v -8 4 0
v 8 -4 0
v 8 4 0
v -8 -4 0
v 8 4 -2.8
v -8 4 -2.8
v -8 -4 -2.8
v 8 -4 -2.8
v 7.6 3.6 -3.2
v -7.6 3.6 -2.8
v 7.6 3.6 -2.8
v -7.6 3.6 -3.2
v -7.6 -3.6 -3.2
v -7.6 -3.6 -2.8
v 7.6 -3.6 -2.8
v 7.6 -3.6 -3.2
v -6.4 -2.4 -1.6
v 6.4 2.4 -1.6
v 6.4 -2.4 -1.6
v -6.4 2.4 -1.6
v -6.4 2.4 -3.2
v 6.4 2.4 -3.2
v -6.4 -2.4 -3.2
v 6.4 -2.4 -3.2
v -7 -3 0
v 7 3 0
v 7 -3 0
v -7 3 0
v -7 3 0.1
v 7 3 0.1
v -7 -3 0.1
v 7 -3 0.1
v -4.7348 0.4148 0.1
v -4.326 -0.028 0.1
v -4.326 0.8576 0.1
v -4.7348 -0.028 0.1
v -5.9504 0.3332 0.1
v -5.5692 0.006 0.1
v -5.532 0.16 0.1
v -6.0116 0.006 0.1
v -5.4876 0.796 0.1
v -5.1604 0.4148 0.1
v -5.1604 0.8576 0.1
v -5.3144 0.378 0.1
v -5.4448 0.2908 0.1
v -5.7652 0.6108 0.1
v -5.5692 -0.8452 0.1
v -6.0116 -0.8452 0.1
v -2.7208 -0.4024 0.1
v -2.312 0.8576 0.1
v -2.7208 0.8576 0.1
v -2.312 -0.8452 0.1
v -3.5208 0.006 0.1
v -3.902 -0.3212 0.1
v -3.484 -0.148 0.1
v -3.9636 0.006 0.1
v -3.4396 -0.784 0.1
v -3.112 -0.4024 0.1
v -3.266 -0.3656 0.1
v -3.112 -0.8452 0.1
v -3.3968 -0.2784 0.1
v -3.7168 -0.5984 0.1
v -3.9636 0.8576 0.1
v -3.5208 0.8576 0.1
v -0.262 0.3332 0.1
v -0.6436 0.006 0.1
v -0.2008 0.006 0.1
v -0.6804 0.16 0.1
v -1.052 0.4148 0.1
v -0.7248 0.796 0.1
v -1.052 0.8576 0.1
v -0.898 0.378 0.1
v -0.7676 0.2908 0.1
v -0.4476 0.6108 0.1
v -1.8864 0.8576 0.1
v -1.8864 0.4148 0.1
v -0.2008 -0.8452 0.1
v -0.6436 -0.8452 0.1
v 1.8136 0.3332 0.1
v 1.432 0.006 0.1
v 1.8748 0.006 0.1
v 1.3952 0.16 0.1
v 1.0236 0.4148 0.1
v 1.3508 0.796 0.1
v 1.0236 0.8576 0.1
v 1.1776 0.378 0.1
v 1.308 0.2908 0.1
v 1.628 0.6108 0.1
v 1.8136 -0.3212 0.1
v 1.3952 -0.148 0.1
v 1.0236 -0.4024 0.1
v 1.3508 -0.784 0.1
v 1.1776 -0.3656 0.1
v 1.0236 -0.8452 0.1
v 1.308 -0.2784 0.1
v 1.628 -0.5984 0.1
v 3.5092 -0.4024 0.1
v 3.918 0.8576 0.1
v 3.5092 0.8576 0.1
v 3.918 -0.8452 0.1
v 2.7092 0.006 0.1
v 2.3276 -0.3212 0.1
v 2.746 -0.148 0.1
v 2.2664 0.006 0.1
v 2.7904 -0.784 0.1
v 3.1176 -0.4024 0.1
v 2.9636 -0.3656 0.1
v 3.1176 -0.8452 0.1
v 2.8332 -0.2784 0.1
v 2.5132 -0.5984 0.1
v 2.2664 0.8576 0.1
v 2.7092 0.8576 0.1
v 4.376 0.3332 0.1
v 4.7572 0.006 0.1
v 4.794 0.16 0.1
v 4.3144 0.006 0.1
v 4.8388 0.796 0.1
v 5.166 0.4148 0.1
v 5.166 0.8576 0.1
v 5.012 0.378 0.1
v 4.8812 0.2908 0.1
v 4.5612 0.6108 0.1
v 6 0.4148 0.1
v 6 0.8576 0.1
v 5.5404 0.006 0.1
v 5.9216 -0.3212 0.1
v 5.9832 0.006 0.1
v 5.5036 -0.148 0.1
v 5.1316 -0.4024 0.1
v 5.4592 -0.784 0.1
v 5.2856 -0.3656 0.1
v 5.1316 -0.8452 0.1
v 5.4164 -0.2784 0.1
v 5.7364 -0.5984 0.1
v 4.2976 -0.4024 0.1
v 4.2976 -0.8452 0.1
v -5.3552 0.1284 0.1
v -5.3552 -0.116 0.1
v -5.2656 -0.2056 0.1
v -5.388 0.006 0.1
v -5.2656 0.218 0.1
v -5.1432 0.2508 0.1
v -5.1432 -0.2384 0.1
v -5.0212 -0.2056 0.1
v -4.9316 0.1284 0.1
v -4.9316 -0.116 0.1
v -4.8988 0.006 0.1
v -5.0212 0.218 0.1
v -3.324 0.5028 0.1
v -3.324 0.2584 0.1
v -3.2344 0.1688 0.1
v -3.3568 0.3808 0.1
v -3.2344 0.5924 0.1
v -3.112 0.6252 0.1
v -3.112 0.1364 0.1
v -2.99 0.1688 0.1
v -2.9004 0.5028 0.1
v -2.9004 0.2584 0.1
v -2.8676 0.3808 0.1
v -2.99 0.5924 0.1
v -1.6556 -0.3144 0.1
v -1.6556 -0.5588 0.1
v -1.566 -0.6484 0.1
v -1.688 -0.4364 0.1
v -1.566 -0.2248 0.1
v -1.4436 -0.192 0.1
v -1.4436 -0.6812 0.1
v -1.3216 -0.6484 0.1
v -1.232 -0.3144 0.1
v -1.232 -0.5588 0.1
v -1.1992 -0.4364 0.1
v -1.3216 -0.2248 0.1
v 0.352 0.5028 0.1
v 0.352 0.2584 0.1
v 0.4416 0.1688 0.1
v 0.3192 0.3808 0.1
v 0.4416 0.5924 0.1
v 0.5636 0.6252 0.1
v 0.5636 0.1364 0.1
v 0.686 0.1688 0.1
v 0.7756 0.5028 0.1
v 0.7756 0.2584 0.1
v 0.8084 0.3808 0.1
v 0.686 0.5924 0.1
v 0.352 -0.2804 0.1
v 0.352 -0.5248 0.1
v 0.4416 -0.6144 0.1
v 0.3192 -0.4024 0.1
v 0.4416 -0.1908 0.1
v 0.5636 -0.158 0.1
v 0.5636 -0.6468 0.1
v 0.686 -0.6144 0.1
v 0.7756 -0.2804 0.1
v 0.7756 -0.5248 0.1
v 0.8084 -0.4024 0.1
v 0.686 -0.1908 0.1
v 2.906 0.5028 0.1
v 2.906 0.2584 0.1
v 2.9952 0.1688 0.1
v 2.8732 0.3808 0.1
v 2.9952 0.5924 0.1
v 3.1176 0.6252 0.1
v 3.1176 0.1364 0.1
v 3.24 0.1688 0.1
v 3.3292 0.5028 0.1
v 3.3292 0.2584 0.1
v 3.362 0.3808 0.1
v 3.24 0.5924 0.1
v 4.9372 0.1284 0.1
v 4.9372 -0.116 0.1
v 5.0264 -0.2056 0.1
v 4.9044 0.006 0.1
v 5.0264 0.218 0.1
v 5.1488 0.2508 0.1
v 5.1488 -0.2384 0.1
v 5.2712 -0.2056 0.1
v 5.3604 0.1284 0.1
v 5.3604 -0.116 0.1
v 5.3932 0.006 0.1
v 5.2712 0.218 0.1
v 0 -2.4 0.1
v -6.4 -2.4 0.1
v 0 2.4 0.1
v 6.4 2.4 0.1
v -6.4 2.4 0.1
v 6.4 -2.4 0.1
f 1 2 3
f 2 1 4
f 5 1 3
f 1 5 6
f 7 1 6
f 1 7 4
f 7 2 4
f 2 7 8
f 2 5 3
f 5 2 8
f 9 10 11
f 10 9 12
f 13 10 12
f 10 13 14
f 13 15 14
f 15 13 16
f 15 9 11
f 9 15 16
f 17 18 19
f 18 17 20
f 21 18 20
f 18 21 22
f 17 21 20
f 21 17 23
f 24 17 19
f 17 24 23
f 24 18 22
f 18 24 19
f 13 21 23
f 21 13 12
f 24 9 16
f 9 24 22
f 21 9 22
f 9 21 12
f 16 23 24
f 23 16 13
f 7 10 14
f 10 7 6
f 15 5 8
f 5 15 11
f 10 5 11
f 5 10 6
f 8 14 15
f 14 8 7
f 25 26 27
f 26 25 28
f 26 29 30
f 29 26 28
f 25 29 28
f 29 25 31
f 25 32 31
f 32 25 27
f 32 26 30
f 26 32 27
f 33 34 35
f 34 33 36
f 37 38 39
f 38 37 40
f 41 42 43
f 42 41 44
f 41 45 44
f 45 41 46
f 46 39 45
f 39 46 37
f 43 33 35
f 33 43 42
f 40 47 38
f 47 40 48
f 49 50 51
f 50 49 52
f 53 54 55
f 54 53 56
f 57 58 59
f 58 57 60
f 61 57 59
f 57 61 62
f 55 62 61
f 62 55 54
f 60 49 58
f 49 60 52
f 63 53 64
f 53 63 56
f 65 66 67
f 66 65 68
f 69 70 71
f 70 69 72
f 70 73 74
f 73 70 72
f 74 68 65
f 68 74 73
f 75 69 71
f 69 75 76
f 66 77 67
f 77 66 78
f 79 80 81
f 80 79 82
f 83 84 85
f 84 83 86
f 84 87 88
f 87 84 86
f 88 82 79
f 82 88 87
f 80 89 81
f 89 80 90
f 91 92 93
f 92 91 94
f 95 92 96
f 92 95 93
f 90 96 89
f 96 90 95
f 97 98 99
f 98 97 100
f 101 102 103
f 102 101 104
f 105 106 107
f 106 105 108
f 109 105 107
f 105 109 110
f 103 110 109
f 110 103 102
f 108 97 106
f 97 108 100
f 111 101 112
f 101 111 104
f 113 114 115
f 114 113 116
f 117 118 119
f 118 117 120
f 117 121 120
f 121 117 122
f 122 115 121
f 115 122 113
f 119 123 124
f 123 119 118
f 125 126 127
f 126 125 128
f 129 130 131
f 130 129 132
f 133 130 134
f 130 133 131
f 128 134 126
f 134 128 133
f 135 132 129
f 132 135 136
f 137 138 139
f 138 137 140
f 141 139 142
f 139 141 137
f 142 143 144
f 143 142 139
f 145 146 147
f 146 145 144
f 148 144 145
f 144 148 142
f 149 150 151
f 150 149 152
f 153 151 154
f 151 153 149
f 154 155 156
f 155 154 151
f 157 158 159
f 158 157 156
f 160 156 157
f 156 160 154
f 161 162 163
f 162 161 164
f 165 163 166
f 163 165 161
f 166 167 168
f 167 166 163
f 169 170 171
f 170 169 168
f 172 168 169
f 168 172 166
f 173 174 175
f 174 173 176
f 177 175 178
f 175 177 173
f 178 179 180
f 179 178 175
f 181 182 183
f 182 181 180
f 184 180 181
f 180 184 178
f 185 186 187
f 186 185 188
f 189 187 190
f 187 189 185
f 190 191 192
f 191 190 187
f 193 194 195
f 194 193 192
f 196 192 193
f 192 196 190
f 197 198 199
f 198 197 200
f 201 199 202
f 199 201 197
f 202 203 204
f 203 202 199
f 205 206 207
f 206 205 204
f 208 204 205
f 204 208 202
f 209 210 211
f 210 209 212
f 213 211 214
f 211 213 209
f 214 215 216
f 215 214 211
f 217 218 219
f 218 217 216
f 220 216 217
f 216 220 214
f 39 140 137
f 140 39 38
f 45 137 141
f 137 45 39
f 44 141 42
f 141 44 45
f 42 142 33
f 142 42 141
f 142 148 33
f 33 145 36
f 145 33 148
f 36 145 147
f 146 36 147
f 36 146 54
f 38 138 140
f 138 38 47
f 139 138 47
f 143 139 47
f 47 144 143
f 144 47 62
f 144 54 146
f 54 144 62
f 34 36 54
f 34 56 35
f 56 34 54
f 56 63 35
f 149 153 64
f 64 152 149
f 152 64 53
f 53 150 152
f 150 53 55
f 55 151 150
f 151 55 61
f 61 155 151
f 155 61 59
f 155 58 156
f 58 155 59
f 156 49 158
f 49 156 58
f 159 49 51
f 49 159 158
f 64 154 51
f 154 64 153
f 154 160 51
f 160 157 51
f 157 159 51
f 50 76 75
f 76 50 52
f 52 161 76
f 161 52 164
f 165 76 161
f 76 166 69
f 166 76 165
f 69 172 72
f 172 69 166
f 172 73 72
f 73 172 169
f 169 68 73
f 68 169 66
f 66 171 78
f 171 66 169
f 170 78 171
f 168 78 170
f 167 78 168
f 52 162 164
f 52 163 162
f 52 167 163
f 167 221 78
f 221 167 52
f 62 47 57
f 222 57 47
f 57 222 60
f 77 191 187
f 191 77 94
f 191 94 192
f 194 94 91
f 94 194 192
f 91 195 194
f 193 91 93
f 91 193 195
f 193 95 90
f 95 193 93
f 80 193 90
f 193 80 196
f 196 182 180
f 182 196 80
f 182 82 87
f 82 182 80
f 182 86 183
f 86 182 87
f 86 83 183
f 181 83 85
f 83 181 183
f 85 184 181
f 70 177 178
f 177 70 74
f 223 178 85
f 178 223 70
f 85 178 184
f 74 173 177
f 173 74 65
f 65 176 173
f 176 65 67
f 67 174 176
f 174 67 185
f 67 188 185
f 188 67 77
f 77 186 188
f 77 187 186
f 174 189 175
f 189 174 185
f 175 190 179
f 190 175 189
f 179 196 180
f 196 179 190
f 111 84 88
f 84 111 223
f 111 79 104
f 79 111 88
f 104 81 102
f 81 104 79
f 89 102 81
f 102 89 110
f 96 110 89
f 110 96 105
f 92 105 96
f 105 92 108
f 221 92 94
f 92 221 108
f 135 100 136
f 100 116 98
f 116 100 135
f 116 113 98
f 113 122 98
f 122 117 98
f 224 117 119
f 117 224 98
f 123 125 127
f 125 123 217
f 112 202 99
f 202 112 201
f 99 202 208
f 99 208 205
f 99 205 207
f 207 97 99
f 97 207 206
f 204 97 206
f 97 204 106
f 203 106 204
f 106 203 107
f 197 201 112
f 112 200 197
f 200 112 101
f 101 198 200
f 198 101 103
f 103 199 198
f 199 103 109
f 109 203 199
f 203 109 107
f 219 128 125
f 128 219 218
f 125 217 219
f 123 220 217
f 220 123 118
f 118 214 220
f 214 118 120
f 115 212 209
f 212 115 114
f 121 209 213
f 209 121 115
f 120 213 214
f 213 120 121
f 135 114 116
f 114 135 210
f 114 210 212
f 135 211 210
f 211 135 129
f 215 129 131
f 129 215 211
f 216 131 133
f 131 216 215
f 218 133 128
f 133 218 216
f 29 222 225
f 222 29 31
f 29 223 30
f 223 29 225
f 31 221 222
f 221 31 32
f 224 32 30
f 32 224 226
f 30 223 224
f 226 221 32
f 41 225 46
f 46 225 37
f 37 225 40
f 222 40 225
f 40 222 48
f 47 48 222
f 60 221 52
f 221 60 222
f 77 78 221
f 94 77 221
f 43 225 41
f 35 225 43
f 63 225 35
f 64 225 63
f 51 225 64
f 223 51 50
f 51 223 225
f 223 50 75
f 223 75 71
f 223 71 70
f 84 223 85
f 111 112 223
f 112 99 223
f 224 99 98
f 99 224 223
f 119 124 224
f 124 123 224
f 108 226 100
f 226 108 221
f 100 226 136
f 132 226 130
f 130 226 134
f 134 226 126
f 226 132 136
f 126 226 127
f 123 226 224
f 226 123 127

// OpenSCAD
// file: ../p/box5.scad
use <../lib.scad>
function ldraw_lib__box5() = [
// 0 Box with 5 Faces and All Edges
// 0 Name: box5.dat
// 0 Author: James Jessiman
// 0 !LDRAW_ORG Primitive UPDATE 2012-01
// 0 !LICENSE Licensed under CC BY 4.0 : see CAreadme.txt
// 
// 0 BFC CERTIFY CCW
  [0,"BFC","CERTIFY"],
  [0,"BFC","CCW"],
// 
// 0 !HISTORY 2002-04-03 [sbliss] Modified for BFC compliance
// 0 !HISTORY 2002-04-25 [PTadmin] Official Update 2002-02
// 0 !HISTORY 2007-06-24 [PTadmin] Header formatted for Contributor Agreement
// 0 !HISTORY 2008-07-01 [PTadmin] Official Update 2008-01
// 0 !HISTORY 2012-02-16 [Philo] Changed to CCW
// 0 !HISTORY 2012-03-30 [PTadmin] Official Update 2012-01
// 
// 
// 2 24 1 1 1 -1 1 1
  [2,24,1,1,1,-1,1,1],
// 2 24 -1 1 1 -1 1 -1
  [2,24,-1,1,1,-1,1,-1],
// 2 24 -1 1 -1 1 1 -1
  [2,24,-1,1,-1,1,1,-1],
// 2 24 1 1 -1 1 1 1
  [2,24,1,1,-1,1,1,1],
// 2 24 1 0 1 -1 0 1
  [2,24,1,0,1,-1,0,1],
// 2 24 -1 0 1 -1 0 -1
  [2,24,-1,0,1,-1,0,-1],
// 2 24 -1 0 -1 1 0 -1
  [2,24,-1,0,-1,1,0,-1],
// 2 24 1 0 -1 1 0 1
  [2,24,1,0,-1,1,0,1],
// 2 24 1 0 1 1 1 1
  [2,24,1,0,1,1,1,1],
// 2 24 -1 0 1 -1 1 1
  [2,24,-1,0,1,-1,1,1],
// 2 24 1 0 -1 1 1 -1
  [2,24,1,0,-1,1,1,-1],
// 2 24 -1 0 -1 -1 1 -1
  [2,24,-1,0,-1,-1,1,-1],
// 4 16 -1 1 1 1 1 1 1 1 -1 -1 1 -1
  [4,16,-1,1,1,1,1,1,1,1,-1,-1,1,-1],
// 4 16 -1 1 1 -1 0 1 1 0 1 1 1 1
  [4,16,-1,1,1,-1,0,1,1,0,1,1,1,1],
// 4 16 -1 1 -1 -1 0 -1 -1 0 1 -1 1 1
  [4,16,-1,1,-1,-1,0,-1,-1,0,1,-1,1,1],
// 4 16 1 1 -1 1 0 -1 -1 0 -1 -1 1 -1
  [4,16,1,1,-1,1,0,-1,-1,0,-1,-1,1,-1],
// 4 16 1 1 1 1 0 1 1 0 -1 1 1 -1
  [4,16,1,1,1,1,0,1,1,0,-1,1,1,-1],
];
module ldraw_lib__box5(step=0, col=false, unit=2/5, alt=false, line=0.2, solid=!$preview)
    makepoly(ldraw_lib__box5(), step=step, col=col, unit=unit, alt=alt, line=line, solid=solid);
ldraw_lib__box5(line=0.2);
// file: ../p/box4.scad
use <../lib.scad>
function ldraw_lib__box4() = [
// 0 Box with 4 Faces (2 Parallel Pairs) and All Edges
// 0 Name: box4.dat
// 0 Author: James Jessiman
// 0 !LDRAW_ORG Primitive UPDATE 2012-01
// 0 !LICENSE Licensed under CC BY 4.0 : see CAreadme.txt
// 
// 0 BFC CERTIFY CCW
  [0,"BFC","CERTIFY"],
  [0,"BFC","CCW"],
// 
// 0 !HISTORY 2002-04-03 [sbliss] Modified for BFC compliance
// 0 !HISTORY 2002-04-25 [PTadmin] Official Update 2002-02
// 0 !HISTORY 2007-06-24 [PTadmin] Header formatted for Contributor Agreement
// 0 !HISTORY 2008-07-01 [PTadmin] Official Update 2008-01
// 0 !HISTORY 2012-02-16 [Philo] Changed to CCW
// 0 !HISTORY 2012-03-30 [PTadmin] Official Update 2012-01
// 
// 
// 2 24 1 1 1 -1 1 1
  [2,24,1,1,1,-1,1,1],
// 2 24 -1 1 1 -1 1 -1
  [2,24,-1,1,1,-1,1,-1],
// 2 24 -1 1 -1 1 1 -1
  [2,24,-1,1,-1,1,1,-1],
// 2 24 1 1 -1 1 1 1
  [2,24,1,1,-1,1,1,1],
// 2 24 1 0 1 -1 0 1
  [2,24,1,0,1,-1,0,1],
// 2 24 -1 0 1 -1 0 -1
  [2,24,-1,0,1,-1,0,-1],
// 2 24 -1 0 -1 1 0 -1
  [2,24,-1,0,-1,1,0,-1],
// 2 24 1 0 -1 1 0 1
  [2,24,1,0,-1,1,0,1],
// 2 24 1 0 1 1 1 1
  [2,24,1,0,1,1,1,1],
// 2 24 -1 0 1 -1 1 1
  [2,24,-1,0,1,-1,1,1],
// 2 24 1 0 -1 1 1 -1
  [2,24,1,0,-1,1,1,-1],
// 2 24 -1 0 -1 -1 1 -1
  [2,24,-1,0,-1,-1,1,-1],
// 4 16 -1 1 1 -1 0 1 1 0 1 1 1 1
  [4,16,-1,1,1,-1,0,1,1,0,1,1,1,1],
// 4 16 -1 1 -1 -1 0 -1 -1 0 1 -1 1 1
  [4,16,-1,1,-1,-1,0,-1,-1,0,1,-1,1,1],
// 4 16 1 1 -1 1 0 -1 -1 0 -1 -1 1 -1
  [4,16,1,1,-1,1,0,-1,-1,0,-1,-1,1,-1],
// 4 16 1 1 1 1 0 1 1 0 -1 1 1 -1
  [4,16,1,1,1,1,0,1,1,0,-1,1,1,-1],
];
module ldraw_lib__box4(step=0, col=false, unit=2/5, alt=false, line=0.2, solid=!$preview)
    makepoly(ldraw_lib__box4(), step=step, col=col, unit=unit, alt=alt, line=line, solid=solid);
ldraw_lib__box4(line=0.2);
// file: ../p/box5-12.scad
use <../lib.scad>
function ldraw_lib__box5_12() = [
// 0 Box with 5 Faces without Any Edges
// 0 Name: box5-12.dat
// 0 Author: Chris Dee [cwdee]
// 0 !LDRAW_ORG Primitive UPDATE 2009-02
// 0 !LICENSE Licensed under CC BY 4.0 : see CAreadme.txt
// 
// 0 BFC CERTIFY CCW
  [0,"BFC","CERTIFY"],
  [0,"BFC","CCW"],
// 
// 0 !HISTORY 2009-09-03 [PTadmin] Official Update 2009-02
// 
// 
// 4 16 1 1 1 1 1 -1 -1 1 -1 -1 1 1
  [4,16,1,1,1,1,1,-1,-1,1,-1,-1,1,1],
// 4 16 -1 0 1 1 0 1 1 1 1 -1 1 1
  [4,16,-1,0,1,1,0,1,1,1,1,-1,1,1],
// 4 16 -1 0 -1 -1 0 1 -1 1 1 -1 1 -1
  [4,16,-1,0,-1,-1,0,1,-1,1,1,-1,1,-1],
// 4 16 1 0 -1 -1 0 -1 -1 1 -1 1 1 -1
  [4,16,1,0,-1,-1,0,-1,-1,1,-1,1,1,-1],
// 4 16 1 0 1 1 0 -1 1 1 -1 1 1 1
  [4,16,1,0,1,1,0,-1,1,1,-1,1,1,1],
// 0
];
module ldraw_lib__box5_12(step=0, col=false, unit=2/5, alt=false, line=0.2, solid=!$preview)
    makepoly(ldraw_lib__box5_12(), step=step, col=col, unit=unit, alt=alt, line=line, solid=solid);
ldraw_lib__box5_12(line=0.2);
// file: s/3069bs01.scad
use <../../lib.scad>
use <../../p/box4.scad>
use <../../p/box5.scad>
function ldraw_lib__s__3069bs01() = [
// 0 ~Tile  1 x  2 with Groove without Top Face
// 0 Name: s\3069bs01.dat
// 0 Author: Santeri Piippo [arezey]
// 0 !LDRAW_ORG Subpart UPDATE 2010-02
// 0 !LICENSE Licensed under CC BY 4.0 : see CAreadme.txt
// 
// 0 BFC CERTIFY CCW
  [0,"BFC","CERTIFY"],
  [0,"BFC","CCW"],
// 
// 0 !HISTORY 2010-07-05 [PTadmin] Official Update 2010-02
// 
// 
// 1 16 0 0 0 20 0 0 0 7 0 0 0 10 box4.dat
  [1,16,0,0,0,20,0,0,0,7,0,0,0,10, ldraw_lib__box4()],
// 1 16 0 7 0 19 0 0 0 1 0 0 0 9 box4.dat
  [1,16,0,7,0,19,0,0,0,1,0,0,0,9, ldraw_lib__box4()],
// 0 BFC INVERTNEXT
  [0,"BFC","INVERTNEXT"],
// 1 16 0 8 0 16 0 0 0 -4 0 0 0 6 box5.dat
  [1,16,0,8,0,16,0,0,0,-4,0,0,0,6, ldraw_lib__box5()],
// 4 16 -19 8 9 -16 8 6 -16 8 -6 -19 8 -9
  [4,16,-19,8,9,-16,8,6,-16,8,-6,-19,8,-9],
// 4 16 19 8 -9 16 8 -6 16 8 6 19 8 9
  [4,16,19,8,-9,16,8,-6,16,8,6,19,8,9],
// 4 16 19 8 9 16 8 6 -16 8 6 -19 8 9
  [4,16,19,8,9,16,8,6,-16,8,6,-19,8,9],
// 4 16 -19 8 -9 -16 8 -6 16 8 -6 19 8 -9
  [4,16,-19,8,-9,-16,8,-6,16,8,-6,19,8,-9],
// 4 16 -20 7 10 -19 7 9 -19 7 -9 -20 7 -10
  [4,16,-20,7,10,-19,7,9,-19,7,-9,-20,7,-10],
// 4 16 20 7 -10 19 7 -9 19 7 9 20 7 10
  [4,16,20,7,-10,19,7,-9,19,7,9,20,7,10],
// 4 16 20 7 10 19 7 9 -19 7 9 -20 7 10
  [4,16,20,7,10,19,7,9,-19,7,9,-20,7,10],
// 4 16 -20 7 -10 -19 7 -9 19 7 -9 20 7 -10
  [4,16,-20,7,-10,-19,7,-9,19,7,-9,20,7,-10],
// 0 //
];
module ldraw_lib__s__3069bs01(step=0, col=false, unit=2/5, alt=false, line=0.2, solid=!$preview)
    makepoly(ldraw_lib__s__3069bs01(), step=step, col=col, unit=unit, alt=alt, line=line, solid=solid);
ldraw_lib__s__3069bs01(line=0.2);
// file: 3069b.scad
use <../lib.scad>
use <s/3069bs01.scad>
function ldraw_lib__3069b() = [
// 0 Tile  1 x  2 with Groove
// 0 Name: 3069b.dat
// 0 Author: Santeri Piippo [arezey]
// 0 !LDRAW_ORG Part UPDATE 2010-02
// 0 !LICENSE Licensed under CC BY 4.0 : see CAreadme.txt
// 
// 0 BFC CERTIFY CCW
  [0,"BFC","CERTIFY"],
  [0,"BFC","CCW"],
// 
// 0 !HISTORY 2010-07-05 [PTadmin] Official Update 2010-02
// 
// 
// 4 16 20 0 -10 20 0 10 -20 0 10 -20 0 -10
  [4,16,20,0,-10,20,0,10,-20,0,10,-20,0,-10],
// 1 16 0 0 0 1 0 0 0 1 0 0 0 1 s\3069bs01.dat
  [1,16,0,0,0,1,0,0,0,1,0,0,0,1, ldraw_lib__s__3069bs01()],
// 0 //
];
module ldraw_lib__3069b(step=0, col=false, unit=2/5, alt=false, line=0.2, solid=!$preview)
    makepoly(ldraw_lib__3069b(), step=step, col=col, unit=unit, alt=alt, line=line, solid=solid);
ldraw_lib__3069b(line=0.2);
// main file
use <../lib.scad>
use <3069b.scad>
use <6259759g.scad>
function ldraw_lib__3069bd0z() = [
// 0 Tile  1 x  2 with Magenta Alien "FUNBUS" Characters and Coral Outline Sticker
// 0 Name: 3069bd0z.dat
// 0 Author: Evert-Jan Boer [ejboer]
// 0 !LDRAW_ORG Shortcut UPDATE 2024-09
// 0 !LICENSE Licensed under CC BY 4.0 : see CAreadme.txt
// 
// 0 BFC CERTIFY CCW
  [0,"BFC","CERTIFY"],
  [0,"BFC","CCW"],
// 
// 0 !CATEGORY Sticker Shortcut
// 0 !KEYWORDS Bricklink 3069pb0775, Set 70828
// 
// 0 !HISTORY 2024-10-27 [OrionP] Official Update 2024-09
// 
// 1 16 0 0 0 1 0 0 0 1 0 0 0 1 3069b.dat
  [1,16,0,0,0,1,0,0,0,1,0,0,0,1, ldraw_lib__3069b()],
// 1 16 0 0 0 1 0 0 0 1 0 0 0 1 6259759g.dat
  [1,16,0,0,0,1,0,0,0,1,0,0,0,1, ldraw_lib__6259759g()],
];
module ldraw_lib__3069bd0z(step=0, col=false, unit=2/5, alt=false, line=0.2, solid=!$preview)
    makepoly(ldraw_lib__3069bd0z(), step=step, col=col, unit=unit, alt=alt, line=line, solid=solid);
ldraw_lib__3069bd0z(line=0.2);
